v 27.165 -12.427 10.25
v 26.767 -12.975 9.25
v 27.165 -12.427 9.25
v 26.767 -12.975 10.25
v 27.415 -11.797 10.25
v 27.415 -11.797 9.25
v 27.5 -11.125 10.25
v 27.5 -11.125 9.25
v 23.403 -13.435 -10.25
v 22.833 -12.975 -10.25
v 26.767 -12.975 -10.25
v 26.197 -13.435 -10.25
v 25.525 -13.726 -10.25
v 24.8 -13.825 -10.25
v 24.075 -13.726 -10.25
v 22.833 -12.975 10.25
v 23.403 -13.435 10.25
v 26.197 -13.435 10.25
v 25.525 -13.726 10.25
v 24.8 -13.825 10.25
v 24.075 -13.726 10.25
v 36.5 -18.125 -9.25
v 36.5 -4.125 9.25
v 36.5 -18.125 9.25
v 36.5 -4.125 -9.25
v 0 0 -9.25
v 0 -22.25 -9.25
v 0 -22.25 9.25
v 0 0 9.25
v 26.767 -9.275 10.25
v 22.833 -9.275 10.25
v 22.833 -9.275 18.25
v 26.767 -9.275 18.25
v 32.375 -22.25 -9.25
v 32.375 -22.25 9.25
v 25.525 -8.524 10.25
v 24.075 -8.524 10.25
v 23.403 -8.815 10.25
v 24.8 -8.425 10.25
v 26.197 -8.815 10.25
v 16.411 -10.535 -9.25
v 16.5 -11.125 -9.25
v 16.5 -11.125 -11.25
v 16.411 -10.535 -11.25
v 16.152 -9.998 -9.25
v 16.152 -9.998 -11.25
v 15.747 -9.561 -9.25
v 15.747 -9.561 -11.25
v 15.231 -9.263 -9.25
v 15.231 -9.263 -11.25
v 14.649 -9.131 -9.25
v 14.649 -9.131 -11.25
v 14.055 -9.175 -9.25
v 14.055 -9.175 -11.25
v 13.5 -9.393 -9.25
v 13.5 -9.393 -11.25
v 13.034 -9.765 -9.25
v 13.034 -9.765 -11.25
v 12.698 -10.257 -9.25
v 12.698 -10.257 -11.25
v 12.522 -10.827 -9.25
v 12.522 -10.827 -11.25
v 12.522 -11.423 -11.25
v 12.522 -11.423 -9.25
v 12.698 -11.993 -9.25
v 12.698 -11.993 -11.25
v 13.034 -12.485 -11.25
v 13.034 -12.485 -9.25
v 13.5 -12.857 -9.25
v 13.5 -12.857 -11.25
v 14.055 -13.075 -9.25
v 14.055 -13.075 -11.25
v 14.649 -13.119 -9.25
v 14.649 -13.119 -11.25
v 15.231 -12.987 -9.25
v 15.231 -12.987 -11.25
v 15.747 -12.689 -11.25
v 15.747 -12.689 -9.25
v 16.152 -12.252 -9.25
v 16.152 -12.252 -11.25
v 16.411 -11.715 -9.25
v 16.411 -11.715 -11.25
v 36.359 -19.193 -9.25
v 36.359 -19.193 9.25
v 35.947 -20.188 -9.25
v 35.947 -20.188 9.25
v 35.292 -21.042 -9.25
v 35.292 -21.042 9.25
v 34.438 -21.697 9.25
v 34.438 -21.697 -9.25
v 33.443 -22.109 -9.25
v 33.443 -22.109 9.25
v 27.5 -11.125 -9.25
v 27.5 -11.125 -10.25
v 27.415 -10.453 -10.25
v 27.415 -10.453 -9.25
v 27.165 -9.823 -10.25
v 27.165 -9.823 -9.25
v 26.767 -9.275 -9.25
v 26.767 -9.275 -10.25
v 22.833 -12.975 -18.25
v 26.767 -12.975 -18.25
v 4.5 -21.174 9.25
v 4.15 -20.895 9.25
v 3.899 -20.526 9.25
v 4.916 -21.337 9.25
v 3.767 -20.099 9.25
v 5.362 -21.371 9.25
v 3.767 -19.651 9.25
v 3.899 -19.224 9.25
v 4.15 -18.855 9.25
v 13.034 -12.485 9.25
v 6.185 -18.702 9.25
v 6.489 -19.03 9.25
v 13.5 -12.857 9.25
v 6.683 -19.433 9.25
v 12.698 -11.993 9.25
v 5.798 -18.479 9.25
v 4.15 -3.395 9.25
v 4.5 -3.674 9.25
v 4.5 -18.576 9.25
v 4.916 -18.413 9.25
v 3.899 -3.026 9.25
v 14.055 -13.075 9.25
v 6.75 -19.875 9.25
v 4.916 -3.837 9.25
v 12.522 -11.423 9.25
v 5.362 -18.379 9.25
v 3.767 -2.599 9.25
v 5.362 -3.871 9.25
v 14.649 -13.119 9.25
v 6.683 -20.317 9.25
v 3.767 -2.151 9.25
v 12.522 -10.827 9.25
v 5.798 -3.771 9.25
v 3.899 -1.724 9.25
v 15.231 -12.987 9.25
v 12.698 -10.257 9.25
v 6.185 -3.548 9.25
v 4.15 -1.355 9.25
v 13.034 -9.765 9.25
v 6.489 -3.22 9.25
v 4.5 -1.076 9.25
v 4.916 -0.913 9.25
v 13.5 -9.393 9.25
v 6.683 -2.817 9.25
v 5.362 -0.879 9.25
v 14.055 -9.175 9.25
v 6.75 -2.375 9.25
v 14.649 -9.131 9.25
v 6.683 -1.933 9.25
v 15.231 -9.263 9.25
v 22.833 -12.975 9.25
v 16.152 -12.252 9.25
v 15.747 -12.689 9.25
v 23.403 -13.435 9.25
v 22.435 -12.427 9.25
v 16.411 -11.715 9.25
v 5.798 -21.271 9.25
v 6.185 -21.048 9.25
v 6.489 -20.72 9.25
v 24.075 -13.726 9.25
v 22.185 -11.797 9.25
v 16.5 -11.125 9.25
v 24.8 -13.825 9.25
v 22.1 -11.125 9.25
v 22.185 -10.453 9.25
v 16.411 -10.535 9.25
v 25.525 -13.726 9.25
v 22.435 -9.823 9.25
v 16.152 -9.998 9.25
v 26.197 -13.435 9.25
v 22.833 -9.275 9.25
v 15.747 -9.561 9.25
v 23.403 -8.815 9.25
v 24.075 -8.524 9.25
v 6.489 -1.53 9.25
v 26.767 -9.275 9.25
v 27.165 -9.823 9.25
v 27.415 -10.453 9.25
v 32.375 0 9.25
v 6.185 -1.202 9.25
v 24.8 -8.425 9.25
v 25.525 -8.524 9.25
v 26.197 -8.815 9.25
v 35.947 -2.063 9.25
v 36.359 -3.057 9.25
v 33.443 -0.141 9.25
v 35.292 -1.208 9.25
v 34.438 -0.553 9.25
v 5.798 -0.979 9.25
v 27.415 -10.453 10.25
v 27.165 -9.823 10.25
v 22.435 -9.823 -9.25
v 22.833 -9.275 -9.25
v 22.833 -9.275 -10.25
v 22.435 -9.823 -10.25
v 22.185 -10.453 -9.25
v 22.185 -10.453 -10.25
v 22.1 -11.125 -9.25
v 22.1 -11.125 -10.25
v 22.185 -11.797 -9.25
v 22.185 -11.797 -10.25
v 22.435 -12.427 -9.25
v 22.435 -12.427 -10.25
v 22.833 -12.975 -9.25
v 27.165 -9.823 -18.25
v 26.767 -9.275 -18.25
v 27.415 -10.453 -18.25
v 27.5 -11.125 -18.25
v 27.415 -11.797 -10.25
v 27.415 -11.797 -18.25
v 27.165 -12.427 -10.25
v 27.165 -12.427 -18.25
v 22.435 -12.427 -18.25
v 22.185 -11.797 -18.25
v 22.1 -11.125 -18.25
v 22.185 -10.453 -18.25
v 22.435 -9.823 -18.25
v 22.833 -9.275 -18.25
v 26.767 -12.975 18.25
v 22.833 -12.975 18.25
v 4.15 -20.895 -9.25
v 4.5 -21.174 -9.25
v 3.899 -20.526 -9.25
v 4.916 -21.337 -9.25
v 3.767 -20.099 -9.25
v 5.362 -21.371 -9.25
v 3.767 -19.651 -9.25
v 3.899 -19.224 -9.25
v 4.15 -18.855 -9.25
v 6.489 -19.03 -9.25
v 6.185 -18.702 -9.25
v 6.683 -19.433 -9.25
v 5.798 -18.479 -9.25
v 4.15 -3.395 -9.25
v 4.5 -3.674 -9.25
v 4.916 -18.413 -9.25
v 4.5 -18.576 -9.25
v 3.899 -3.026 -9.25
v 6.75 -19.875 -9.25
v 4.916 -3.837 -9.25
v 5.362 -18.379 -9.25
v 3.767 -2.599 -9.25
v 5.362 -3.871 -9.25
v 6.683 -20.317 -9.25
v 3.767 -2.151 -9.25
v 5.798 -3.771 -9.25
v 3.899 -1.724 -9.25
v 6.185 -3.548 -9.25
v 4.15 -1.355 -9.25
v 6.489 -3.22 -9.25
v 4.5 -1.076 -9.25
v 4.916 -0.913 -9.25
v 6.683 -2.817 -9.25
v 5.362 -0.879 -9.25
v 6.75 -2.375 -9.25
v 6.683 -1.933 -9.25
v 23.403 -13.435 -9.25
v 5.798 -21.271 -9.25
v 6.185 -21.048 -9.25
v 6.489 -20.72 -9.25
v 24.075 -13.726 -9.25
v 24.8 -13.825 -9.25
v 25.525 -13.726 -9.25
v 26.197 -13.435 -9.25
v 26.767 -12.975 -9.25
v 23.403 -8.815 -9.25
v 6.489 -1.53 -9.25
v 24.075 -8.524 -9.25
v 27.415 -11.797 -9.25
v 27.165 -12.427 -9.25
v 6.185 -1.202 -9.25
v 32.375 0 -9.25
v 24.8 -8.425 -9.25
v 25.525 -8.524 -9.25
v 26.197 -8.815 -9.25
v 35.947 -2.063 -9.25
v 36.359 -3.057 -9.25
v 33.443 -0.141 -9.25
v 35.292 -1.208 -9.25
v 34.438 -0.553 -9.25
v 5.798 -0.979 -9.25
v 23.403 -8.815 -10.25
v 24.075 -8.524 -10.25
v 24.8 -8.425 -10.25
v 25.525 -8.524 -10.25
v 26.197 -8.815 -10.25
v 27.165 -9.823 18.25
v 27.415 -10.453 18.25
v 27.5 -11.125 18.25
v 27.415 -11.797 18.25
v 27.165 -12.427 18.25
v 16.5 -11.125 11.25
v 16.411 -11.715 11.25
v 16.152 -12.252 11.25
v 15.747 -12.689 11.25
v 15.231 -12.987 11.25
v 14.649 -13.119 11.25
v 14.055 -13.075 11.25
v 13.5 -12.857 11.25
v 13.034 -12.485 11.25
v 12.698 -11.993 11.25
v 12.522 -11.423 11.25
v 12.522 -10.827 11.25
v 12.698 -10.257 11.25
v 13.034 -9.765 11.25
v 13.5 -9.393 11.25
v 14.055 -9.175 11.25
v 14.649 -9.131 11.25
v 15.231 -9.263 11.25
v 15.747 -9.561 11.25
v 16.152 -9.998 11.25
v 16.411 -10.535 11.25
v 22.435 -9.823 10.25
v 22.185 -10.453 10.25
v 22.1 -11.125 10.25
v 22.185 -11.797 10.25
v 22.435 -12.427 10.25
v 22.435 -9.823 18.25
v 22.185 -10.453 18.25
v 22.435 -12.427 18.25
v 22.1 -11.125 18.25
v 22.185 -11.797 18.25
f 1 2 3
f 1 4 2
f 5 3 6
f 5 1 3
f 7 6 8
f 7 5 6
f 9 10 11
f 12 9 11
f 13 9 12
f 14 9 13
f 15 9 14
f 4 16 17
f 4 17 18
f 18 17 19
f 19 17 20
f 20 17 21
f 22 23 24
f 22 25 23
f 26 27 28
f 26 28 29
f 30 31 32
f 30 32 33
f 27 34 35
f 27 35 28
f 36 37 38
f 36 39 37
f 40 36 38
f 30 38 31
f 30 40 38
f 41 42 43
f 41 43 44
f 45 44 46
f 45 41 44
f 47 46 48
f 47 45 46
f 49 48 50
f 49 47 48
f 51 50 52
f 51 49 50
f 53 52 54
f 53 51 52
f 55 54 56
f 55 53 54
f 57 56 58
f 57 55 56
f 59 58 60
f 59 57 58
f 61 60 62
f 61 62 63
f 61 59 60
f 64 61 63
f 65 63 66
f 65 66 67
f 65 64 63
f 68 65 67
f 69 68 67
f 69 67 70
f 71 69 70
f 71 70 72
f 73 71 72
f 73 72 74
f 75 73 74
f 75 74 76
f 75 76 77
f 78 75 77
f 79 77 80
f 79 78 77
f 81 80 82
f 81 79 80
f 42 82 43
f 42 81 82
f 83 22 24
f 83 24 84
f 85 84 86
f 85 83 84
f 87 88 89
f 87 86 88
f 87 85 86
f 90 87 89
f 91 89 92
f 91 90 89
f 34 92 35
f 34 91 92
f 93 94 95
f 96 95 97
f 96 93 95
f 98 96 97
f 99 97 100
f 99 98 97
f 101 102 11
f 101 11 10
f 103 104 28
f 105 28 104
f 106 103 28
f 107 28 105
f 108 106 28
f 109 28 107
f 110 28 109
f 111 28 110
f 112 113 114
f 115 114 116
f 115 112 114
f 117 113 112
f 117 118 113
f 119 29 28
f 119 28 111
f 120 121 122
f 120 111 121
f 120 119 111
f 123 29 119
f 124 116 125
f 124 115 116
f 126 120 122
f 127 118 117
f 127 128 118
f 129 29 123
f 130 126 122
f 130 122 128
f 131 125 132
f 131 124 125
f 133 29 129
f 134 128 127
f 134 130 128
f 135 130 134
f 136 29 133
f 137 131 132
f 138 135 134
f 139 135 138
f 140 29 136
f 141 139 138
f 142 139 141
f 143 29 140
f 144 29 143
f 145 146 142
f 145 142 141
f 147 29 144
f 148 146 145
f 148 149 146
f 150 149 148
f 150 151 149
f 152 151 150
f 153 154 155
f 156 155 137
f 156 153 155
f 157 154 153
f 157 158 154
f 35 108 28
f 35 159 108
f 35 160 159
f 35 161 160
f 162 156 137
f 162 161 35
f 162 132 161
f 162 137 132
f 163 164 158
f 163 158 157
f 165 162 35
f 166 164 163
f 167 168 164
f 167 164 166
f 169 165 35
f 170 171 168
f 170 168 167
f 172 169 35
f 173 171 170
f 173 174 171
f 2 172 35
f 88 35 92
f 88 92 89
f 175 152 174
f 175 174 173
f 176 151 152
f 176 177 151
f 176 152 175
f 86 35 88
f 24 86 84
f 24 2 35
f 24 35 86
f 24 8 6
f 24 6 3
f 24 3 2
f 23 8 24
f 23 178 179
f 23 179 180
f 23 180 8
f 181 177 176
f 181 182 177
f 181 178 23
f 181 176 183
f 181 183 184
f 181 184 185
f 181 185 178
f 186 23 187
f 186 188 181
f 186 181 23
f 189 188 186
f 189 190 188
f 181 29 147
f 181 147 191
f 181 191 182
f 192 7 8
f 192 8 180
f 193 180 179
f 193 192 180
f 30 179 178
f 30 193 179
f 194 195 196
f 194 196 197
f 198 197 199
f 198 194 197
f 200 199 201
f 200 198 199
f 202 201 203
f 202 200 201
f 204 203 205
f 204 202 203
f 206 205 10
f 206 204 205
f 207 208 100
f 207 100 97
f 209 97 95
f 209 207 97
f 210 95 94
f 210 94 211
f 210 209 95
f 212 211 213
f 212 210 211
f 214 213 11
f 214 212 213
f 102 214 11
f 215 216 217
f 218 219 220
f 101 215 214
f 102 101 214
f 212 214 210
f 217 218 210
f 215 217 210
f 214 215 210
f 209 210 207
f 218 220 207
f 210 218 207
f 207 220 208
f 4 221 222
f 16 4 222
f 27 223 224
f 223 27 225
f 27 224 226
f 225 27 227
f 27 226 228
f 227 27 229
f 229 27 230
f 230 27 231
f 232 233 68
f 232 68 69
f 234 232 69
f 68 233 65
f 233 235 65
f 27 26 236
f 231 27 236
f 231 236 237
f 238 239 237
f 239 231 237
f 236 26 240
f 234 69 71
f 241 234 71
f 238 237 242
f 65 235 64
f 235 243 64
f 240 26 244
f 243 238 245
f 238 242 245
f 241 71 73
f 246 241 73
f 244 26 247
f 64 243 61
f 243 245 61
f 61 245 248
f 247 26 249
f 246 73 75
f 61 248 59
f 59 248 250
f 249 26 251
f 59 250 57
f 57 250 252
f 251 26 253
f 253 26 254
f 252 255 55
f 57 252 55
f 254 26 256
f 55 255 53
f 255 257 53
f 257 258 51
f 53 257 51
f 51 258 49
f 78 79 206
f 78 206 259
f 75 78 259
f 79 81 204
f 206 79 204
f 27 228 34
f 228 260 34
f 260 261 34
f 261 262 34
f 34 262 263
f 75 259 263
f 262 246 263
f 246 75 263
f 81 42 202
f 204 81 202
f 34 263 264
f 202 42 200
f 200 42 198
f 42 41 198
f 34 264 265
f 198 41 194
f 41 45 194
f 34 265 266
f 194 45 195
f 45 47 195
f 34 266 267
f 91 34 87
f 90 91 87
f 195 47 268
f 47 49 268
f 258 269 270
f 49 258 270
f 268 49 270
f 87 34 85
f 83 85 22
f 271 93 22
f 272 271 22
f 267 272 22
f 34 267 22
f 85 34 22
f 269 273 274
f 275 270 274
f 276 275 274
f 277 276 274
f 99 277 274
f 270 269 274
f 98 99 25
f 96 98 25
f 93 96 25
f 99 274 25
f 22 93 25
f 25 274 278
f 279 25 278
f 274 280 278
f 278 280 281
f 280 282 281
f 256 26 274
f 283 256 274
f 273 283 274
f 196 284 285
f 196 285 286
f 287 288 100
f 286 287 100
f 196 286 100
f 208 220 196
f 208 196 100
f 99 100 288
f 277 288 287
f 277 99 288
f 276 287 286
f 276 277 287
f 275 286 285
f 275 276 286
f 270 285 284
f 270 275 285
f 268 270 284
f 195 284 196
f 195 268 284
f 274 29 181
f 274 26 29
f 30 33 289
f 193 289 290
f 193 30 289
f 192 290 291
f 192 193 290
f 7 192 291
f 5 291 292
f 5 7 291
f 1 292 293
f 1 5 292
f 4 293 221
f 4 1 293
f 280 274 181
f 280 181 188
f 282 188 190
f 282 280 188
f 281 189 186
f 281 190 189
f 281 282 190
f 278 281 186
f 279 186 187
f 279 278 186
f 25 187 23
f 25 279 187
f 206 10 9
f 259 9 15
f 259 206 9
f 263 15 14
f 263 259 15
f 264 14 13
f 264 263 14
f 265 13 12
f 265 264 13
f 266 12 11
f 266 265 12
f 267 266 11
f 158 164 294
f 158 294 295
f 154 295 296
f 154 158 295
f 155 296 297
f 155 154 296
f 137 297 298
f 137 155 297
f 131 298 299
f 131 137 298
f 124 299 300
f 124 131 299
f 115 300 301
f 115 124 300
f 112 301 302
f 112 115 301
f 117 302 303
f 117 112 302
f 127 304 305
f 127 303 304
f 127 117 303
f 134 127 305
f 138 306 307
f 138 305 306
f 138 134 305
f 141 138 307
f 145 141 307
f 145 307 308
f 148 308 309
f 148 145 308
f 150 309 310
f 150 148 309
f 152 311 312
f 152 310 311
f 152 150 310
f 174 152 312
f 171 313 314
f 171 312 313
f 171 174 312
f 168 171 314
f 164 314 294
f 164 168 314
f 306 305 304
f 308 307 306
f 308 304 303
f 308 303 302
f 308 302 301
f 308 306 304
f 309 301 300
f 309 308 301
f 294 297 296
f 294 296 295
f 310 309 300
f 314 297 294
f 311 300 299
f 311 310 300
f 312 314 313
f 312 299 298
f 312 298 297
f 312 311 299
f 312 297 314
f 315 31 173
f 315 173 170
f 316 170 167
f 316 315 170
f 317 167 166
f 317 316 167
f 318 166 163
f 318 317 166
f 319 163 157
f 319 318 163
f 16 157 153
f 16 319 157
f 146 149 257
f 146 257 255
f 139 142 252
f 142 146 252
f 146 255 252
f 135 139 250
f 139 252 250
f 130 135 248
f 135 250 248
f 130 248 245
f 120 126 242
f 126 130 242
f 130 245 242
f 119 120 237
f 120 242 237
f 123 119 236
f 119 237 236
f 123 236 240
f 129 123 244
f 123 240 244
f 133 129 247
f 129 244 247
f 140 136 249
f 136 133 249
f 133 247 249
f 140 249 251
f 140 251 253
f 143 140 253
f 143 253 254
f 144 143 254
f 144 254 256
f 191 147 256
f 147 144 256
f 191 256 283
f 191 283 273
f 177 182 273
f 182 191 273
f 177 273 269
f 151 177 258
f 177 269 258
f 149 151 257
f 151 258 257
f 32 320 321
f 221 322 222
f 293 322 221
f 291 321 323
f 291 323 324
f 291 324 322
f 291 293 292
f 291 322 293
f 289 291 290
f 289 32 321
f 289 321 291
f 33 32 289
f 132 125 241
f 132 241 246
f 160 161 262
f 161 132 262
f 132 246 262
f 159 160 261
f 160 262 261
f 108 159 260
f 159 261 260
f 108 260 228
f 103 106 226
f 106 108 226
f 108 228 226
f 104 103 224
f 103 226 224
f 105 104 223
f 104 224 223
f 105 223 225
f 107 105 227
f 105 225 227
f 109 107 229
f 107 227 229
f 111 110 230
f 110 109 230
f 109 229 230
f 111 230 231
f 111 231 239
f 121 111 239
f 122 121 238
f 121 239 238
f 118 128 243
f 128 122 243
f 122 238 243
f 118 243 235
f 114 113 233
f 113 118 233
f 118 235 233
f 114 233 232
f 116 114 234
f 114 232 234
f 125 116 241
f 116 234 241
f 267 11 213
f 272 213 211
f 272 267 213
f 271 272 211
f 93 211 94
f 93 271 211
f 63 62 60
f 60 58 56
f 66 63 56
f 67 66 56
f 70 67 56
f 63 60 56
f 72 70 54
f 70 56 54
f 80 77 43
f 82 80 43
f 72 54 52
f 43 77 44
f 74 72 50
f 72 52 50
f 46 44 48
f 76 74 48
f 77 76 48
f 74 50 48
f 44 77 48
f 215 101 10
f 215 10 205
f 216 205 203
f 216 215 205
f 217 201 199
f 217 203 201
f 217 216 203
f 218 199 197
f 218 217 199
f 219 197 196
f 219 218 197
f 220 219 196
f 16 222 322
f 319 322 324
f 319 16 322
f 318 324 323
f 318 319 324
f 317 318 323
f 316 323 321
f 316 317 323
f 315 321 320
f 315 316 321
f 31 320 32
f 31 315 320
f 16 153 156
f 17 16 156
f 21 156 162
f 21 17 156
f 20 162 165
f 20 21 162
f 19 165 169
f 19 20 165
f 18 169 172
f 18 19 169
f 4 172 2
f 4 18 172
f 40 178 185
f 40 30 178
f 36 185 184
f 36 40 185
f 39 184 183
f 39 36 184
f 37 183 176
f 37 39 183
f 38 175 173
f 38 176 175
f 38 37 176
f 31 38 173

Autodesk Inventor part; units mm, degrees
ref_plane "YZ Plane" through (0, 0, 0) normal (1, 0, 0) x (0, 1, 0)
ref_plane "XZ Plane" through (0, 0, 0) normal (0, 1, 0) x (-1, 0, 0)
ref_plane "XY Plane" through (0, 0, 0) normal (0, 0, 1) x (1, 0, 0)
sketch "Sketch1" plane through (0, 0, 0) normal (0, 0, 1) x (1, 0, 0)
  line L0 (0, 0) -> (32.375, 0)
  line L1 (36.5, 0) -> (36.5, -4.125)
  line L2 (36.5, -22.25) -> (0, -22.25)
  line L3 (0, -22.25) -> (0, -11.125)
  line L4 (0, -11.125) -> (36.5, -11.125) construction
  line L5 (0, -11.125) -> (0, 0)
  circle A0 centre (14.5, -11.125) radius 2
  circle A1 centre (5.25, -2.375) radius 1.5
  arc A2 (36.5, -4.125) -> (32.375, 0) centre (32.375, -4.125) ccw
  line L6 (32.375, 0) -> (36.5, 0)
  line L7 (36.5, -4.125) -> (36.5, -22.25)
  arc A3 (32.375, -22.25) -> (36.5, -18.125) centre (32.375, -18.125) ccw
  circle A4 centre (5.25, -19.875) radius 1.5
  circle A5 centre (24.8, -11.125) radius 2.7
  line L8 (22.8334, -9.275) -> (26.7666, -9.275)
  line L9 (26.7666, -12.975) -> (22.8334, -12.975)
  point P0 (36.5, -18.125)
  dimension "d6" = 4
  dimension "d8" = 3
  dimension "d11" = 5.25
  dimension "d12" = 22.25
  dimension "d13" = 8.75
  dimension "d16" = 14.5
  dimension "d17" = 14
  dimension "d18" = 36.5
  dimension "d19" = 3.7
  dimension "d28" = 5.4
  dimension "d29" = 11.7
extrude "Extrusion1" add sketch "Sketch1" along normal mid plane 18.5 contours L0 A2 L7 A3 L2 L3 L5
extrude "Extrusion2" add sketch "Sketch1" along normal mid plane 22.5 contours A0
extrude "Extrusion3" add sketch "Sketch1" along normal mid plane 20.5 contours A5 L9 L8 | L8 A5 | A5 L9
extrude "Extrusion4" add sketch "Sketch1" along normal mid plane 36.5 contours A5 L9 L8
sketch "Sketch2" plane through (0, -22.25, 9.25) normal (-1, 0, 0) x (0, 0, 1)
  point P0 (-9.25, 22.25)
properties part number "TT motor output"
